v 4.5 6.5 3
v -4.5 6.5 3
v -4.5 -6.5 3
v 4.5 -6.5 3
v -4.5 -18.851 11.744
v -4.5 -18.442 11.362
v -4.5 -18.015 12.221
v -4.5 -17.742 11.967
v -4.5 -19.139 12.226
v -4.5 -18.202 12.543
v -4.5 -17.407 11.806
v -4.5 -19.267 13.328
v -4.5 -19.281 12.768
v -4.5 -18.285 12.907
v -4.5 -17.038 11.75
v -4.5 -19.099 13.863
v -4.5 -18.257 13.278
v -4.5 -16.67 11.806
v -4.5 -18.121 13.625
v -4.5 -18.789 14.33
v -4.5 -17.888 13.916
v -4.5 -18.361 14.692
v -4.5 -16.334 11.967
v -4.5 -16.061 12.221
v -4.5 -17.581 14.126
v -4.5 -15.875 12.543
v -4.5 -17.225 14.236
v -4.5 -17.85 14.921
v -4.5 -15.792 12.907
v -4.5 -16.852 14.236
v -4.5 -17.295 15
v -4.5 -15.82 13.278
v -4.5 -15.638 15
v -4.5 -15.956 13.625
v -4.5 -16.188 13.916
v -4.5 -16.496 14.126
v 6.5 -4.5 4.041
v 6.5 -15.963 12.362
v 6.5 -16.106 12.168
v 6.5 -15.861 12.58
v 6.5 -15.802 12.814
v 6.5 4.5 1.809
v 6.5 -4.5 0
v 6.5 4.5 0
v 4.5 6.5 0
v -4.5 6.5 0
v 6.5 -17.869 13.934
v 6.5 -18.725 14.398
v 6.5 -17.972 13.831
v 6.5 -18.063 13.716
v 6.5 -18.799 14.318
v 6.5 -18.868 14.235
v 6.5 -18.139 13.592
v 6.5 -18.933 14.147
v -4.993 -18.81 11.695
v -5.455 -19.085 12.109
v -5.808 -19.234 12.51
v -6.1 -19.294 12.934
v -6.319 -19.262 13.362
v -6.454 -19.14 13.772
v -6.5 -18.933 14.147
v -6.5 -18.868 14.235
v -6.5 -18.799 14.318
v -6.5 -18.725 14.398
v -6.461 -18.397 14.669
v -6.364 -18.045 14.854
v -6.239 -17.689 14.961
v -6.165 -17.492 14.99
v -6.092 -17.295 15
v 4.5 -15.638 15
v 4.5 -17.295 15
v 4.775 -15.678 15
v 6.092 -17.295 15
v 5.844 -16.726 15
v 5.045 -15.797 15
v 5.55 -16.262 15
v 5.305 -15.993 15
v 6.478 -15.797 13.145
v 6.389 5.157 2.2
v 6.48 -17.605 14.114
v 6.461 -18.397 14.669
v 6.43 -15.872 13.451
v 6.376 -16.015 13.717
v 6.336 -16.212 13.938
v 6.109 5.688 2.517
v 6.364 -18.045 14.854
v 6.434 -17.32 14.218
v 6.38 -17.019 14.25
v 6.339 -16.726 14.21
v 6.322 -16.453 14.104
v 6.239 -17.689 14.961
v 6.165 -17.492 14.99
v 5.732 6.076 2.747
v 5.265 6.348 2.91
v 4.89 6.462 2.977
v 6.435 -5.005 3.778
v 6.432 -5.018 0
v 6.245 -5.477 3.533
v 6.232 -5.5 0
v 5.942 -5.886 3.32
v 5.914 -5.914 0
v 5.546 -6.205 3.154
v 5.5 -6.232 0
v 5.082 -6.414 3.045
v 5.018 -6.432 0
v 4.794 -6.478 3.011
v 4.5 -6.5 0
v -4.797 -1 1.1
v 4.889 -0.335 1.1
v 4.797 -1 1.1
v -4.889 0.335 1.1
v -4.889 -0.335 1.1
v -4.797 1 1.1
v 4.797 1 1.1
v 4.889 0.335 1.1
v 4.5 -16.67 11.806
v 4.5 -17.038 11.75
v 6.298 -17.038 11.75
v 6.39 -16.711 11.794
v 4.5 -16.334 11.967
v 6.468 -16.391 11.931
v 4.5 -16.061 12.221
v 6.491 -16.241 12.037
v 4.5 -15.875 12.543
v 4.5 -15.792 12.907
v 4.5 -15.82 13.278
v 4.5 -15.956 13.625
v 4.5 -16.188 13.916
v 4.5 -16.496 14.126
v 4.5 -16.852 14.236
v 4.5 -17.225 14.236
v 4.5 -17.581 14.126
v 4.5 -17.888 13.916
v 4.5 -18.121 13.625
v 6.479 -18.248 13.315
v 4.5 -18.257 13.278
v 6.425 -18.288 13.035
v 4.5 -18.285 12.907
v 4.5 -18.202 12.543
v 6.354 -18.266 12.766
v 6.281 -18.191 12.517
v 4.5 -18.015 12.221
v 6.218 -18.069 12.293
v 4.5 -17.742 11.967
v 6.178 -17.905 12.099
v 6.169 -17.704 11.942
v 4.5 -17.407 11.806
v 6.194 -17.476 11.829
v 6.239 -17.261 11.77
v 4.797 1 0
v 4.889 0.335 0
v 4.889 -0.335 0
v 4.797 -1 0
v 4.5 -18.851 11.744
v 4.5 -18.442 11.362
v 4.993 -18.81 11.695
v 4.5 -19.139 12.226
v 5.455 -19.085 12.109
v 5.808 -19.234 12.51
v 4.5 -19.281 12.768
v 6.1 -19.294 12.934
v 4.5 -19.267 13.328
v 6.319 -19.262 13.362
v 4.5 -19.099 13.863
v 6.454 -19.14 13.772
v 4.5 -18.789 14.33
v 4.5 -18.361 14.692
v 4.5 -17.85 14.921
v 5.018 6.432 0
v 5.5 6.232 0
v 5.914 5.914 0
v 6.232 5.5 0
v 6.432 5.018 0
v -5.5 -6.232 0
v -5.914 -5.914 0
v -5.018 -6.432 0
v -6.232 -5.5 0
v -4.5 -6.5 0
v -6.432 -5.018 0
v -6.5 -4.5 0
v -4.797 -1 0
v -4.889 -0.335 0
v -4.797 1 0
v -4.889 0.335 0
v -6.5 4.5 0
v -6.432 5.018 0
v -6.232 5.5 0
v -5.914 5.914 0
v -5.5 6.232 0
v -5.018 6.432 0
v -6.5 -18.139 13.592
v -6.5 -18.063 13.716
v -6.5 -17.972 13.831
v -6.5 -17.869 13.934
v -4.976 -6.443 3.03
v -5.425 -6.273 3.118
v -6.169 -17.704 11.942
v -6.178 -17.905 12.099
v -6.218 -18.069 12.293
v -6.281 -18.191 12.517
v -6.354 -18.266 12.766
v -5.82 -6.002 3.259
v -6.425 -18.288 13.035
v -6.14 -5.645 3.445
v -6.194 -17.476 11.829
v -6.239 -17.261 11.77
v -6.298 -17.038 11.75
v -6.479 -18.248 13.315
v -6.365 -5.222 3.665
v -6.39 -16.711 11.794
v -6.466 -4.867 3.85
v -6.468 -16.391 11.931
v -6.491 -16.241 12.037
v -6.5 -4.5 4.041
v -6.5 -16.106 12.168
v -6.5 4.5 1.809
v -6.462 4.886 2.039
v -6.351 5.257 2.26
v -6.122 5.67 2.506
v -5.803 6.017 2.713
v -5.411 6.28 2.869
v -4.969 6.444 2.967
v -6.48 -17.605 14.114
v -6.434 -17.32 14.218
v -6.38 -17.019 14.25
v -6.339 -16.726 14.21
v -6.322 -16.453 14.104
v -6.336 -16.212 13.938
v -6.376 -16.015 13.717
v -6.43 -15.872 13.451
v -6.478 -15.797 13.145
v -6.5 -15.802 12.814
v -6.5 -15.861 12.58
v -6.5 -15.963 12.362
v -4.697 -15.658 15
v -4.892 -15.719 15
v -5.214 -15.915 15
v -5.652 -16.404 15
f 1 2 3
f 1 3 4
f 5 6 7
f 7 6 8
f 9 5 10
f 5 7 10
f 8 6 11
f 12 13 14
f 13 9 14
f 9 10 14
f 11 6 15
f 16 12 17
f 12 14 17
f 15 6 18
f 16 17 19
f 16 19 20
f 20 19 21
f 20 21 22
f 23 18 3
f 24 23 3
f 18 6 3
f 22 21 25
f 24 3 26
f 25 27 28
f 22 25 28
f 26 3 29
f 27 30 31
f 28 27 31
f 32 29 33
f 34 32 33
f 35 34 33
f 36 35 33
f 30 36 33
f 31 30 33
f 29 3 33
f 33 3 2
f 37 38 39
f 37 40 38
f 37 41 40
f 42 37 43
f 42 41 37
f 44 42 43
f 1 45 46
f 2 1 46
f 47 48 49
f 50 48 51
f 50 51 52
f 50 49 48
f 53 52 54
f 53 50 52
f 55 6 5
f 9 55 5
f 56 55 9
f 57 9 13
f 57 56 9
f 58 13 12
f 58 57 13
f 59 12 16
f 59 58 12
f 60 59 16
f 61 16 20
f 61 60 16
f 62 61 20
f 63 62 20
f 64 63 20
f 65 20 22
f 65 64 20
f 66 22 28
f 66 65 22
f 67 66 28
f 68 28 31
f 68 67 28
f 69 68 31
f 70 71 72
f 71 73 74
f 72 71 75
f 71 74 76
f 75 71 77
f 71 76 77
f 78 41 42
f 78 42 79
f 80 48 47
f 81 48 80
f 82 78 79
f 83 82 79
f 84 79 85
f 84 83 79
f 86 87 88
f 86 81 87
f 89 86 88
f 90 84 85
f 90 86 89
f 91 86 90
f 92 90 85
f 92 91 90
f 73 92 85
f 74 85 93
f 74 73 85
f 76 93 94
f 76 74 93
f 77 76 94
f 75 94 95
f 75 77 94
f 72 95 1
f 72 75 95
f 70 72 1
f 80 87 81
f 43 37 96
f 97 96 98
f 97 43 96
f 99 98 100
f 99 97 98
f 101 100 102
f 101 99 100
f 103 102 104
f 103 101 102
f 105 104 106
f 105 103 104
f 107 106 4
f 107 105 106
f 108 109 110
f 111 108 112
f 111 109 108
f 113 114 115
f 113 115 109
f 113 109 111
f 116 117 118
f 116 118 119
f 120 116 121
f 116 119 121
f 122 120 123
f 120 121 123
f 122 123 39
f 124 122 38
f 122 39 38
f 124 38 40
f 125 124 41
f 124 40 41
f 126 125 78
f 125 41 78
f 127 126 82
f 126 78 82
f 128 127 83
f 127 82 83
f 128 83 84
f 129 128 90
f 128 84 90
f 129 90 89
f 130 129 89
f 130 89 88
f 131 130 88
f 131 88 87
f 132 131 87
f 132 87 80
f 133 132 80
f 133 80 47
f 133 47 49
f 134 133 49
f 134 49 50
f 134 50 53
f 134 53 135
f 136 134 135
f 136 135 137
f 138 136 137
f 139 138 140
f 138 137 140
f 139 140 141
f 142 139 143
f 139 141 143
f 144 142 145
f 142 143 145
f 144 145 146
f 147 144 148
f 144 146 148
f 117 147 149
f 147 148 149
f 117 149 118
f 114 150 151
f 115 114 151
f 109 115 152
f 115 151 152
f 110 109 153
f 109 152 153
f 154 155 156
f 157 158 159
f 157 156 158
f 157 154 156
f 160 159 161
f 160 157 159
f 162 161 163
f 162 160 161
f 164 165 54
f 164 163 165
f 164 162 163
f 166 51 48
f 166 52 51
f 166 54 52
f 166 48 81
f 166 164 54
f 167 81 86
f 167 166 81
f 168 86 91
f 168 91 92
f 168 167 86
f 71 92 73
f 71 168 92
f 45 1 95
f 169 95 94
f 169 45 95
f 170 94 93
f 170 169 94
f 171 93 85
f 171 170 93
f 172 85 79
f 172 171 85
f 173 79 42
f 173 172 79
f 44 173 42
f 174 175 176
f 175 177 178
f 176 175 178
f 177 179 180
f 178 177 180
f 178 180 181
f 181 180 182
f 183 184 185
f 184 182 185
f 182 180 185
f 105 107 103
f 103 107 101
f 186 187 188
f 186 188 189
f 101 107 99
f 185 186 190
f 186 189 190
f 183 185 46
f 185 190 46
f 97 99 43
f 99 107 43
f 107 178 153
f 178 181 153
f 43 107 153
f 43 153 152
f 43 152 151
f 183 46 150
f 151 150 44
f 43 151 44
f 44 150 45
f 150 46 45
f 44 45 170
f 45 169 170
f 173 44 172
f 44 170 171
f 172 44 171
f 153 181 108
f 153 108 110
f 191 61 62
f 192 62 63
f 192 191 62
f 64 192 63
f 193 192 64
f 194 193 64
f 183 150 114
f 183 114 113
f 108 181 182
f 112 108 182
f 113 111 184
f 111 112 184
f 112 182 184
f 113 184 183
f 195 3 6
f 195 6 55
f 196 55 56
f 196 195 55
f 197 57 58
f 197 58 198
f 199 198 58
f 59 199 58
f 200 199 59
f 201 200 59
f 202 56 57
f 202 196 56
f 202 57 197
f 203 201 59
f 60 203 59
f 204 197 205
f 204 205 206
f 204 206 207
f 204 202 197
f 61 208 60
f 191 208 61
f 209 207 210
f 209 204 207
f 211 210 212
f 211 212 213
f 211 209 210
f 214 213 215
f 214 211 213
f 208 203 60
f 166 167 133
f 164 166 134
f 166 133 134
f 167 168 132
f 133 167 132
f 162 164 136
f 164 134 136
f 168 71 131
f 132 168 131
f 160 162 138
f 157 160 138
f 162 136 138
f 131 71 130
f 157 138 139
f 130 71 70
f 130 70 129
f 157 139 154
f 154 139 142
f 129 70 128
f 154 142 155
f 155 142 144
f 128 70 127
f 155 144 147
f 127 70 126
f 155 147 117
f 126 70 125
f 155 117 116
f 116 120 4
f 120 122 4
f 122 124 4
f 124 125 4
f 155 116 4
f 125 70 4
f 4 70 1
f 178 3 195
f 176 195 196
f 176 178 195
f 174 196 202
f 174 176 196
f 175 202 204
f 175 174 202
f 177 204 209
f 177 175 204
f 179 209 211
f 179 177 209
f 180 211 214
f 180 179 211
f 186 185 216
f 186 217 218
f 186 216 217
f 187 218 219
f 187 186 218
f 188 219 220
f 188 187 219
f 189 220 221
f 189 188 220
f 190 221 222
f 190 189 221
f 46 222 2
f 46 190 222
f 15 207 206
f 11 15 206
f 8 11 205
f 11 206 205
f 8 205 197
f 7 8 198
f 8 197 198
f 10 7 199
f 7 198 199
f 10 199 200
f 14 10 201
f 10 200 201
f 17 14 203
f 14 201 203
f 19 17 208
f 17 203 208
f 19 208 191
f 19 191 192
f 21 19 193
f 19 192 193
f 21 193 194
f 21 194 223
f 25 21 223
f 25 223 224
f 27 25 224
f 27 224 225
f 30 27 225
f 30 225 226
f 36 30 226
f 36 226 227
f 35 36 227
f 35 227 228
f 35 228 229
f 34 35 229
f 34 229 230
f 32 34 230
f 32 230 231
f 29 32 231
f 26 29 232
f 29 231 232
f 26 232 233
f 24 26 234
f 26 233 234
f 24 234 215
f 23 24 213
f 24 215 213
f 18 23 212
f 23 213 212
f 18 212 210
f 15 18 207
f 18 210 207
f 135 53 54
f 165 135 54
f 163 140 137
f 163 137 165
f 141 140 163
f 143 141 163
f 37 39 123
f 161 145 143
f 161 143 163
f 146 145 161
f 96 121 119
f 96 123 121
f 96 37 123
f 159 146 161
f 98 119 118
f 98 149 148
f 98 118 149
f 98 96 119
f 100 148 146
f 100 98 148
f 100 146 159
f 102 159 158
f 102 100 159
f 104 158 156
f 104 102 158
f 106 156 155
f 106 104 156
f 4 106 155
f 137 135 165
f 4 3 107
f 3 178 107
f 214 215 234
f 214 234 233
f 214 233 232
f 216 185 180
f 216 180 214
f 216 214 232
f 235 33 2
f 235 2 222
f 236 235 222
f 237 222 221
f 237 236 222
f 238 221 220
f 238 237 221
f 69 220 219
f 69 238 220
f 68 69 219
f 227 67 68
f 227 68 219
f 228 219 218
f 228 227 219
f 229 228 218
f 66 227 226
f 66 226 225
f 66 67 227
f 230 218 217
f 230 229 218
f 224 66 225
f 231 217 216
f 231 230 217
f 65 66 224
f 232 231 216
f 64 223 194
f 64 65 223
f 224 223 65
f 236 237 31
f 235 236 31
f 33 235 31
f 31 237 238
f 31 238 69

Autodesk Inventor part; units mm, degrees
ref_plane "YZ Plane" through (0, 0, 0) normal (1, 0, 0) x (0, 1, 0)
ref_plane "XZ Plane" through (0, 0, 0) normal (0, 1, 0) x (-1, 0, 0)
ref_plane "XY Plane" through (0, 0, 0) normal (0, 0, 1) x (1, 0, 0)
sketch "Sketch1" plane through (0, 0, 0) normal (0, 0, 1) x (1, 0, 0)
  line L0 (6.5, 6.5) -> (-6.5, 6.5)
  line L1 (-6.5, 6.5) -> (-6.5, -6.5)
  line L2 (-6.5, -6.5) -> (6.5, -6.5)
  line L3 (6.5, -6.5) -> (6.5, 6.5)
  line L4 (6.5, 6.5) -> (-6.5, -6.5) construction
  line L5 (-6.5, 6.5) -> (6.5, -6.5) construction
  point P0 (0, 0)
  point P1 (0, 0)
  dimension "d35" = 13
  dimension "d36" = 13
extrude "Extrusion1" add sketch "Sketch1" along normal blind 3
sketch "Sketch2" plane through (0, 0, 0) normal (0, 0, -1) x (-1, 0, 0)
  line L0 (-6.5, 1) -> (6.5, 1)
  line L1 (6.5, 1) -> (6.5, -1)
  line L2 (6.5, -1) -> (-6.5, -1)
  line L3 (-6.5, -1) -> (-6.5, 1)
  line L4 (-6.5, 1) -> (6.5, -1) construction
  line L5 (6.5, 1) -> (-6.5, -1) construction
  circle A0 centre (0, 0) radius 4.9
  point P0 (4.7969, 1)
  point P1 (-4.7969, 1)
  point P2 (-4.7969, -1)
  point P3 (4.7969, -1)
  dimension "d3" = 2
  dimension "d4" = 13
  dimension "d57" = 9.8
extrude "Extrusion2" cut sketch "Sketch2" against normal blind 1.1 contours L0 A0 L2
sketch "Sketch22" plane through (6.5, -6.5, 0) normal (1, 0, 0) x (0, 0, -1)
  line L0 (0, 13) -> (-3, 13) projected
  line L1 (-3, 13) -> (-3, 0) projected
  line L2 (-3, 13) -> (-3, 0)
  line L3 (-3, 0) -> (-15, -17.1378)
  line L4 (-15, -17.1378) -> (-15, -9.1378)
  line L5 (-15, -9.1378) -> (-3, 13)
  line L6 (0, 0) -> (0, 13) projected
  point P0 (0, 6.5)
  point P1 (0, 6.5)
  dimension "d131" = 145
  dimension "d132" = 8
  dimension "d133" = 15
extrude "Extrusion20" add sketch "Sketch22" against normal blind 2
sketch "Sketch24" plane through (6.5, -6.5, 0) normal (1, 0, 0) x (0, 0, -1)
  circle A0 centre (-13, -10.5382) radius 1.25
  line L0 (0, 0) -> (0, 13) projected
  line L1 (-3, 13) -> (-15, -9.1378) projected
  line L2 (-15, -17.1378) -> (-3, 0) projected
  line L3 (-14.7588, -9.3067) -> (-11.2412, -11.7697) construction
  line L4 (-15, -17.1378) -> (-15, -9.1378) projected
  point P0 (0, 6.5)
  point P1 (0, 6.5)
  dimension "d141" = 2.5
  dimension "d142" = 13
  dimension "d149" = 90
extrude "Extrusion22" cut sketch "Sketch24" against normal blind 2
mirror "Mirror2" about plane through (0, 0, 0) normal (1, 0, 0) of "Extrusion20", "Extrusion22"
fillet "Fillet6" radius 2 10 edges at (-5.5, -23.6378, 15) (5.5, -23.6378, 15) (-6.5, -4.5689, 9) (6.5, -4.5689, 9) (-6.5, 6.5, 1.5) (-6.5, -15.0689, 9) (-6.5, -6.5, 1.5) (6.5, -15.0689, 9) (6.5, -6.5, 1.5) (6.5, 6.5, 1.5)
properties part number "PodstawkaKola"
